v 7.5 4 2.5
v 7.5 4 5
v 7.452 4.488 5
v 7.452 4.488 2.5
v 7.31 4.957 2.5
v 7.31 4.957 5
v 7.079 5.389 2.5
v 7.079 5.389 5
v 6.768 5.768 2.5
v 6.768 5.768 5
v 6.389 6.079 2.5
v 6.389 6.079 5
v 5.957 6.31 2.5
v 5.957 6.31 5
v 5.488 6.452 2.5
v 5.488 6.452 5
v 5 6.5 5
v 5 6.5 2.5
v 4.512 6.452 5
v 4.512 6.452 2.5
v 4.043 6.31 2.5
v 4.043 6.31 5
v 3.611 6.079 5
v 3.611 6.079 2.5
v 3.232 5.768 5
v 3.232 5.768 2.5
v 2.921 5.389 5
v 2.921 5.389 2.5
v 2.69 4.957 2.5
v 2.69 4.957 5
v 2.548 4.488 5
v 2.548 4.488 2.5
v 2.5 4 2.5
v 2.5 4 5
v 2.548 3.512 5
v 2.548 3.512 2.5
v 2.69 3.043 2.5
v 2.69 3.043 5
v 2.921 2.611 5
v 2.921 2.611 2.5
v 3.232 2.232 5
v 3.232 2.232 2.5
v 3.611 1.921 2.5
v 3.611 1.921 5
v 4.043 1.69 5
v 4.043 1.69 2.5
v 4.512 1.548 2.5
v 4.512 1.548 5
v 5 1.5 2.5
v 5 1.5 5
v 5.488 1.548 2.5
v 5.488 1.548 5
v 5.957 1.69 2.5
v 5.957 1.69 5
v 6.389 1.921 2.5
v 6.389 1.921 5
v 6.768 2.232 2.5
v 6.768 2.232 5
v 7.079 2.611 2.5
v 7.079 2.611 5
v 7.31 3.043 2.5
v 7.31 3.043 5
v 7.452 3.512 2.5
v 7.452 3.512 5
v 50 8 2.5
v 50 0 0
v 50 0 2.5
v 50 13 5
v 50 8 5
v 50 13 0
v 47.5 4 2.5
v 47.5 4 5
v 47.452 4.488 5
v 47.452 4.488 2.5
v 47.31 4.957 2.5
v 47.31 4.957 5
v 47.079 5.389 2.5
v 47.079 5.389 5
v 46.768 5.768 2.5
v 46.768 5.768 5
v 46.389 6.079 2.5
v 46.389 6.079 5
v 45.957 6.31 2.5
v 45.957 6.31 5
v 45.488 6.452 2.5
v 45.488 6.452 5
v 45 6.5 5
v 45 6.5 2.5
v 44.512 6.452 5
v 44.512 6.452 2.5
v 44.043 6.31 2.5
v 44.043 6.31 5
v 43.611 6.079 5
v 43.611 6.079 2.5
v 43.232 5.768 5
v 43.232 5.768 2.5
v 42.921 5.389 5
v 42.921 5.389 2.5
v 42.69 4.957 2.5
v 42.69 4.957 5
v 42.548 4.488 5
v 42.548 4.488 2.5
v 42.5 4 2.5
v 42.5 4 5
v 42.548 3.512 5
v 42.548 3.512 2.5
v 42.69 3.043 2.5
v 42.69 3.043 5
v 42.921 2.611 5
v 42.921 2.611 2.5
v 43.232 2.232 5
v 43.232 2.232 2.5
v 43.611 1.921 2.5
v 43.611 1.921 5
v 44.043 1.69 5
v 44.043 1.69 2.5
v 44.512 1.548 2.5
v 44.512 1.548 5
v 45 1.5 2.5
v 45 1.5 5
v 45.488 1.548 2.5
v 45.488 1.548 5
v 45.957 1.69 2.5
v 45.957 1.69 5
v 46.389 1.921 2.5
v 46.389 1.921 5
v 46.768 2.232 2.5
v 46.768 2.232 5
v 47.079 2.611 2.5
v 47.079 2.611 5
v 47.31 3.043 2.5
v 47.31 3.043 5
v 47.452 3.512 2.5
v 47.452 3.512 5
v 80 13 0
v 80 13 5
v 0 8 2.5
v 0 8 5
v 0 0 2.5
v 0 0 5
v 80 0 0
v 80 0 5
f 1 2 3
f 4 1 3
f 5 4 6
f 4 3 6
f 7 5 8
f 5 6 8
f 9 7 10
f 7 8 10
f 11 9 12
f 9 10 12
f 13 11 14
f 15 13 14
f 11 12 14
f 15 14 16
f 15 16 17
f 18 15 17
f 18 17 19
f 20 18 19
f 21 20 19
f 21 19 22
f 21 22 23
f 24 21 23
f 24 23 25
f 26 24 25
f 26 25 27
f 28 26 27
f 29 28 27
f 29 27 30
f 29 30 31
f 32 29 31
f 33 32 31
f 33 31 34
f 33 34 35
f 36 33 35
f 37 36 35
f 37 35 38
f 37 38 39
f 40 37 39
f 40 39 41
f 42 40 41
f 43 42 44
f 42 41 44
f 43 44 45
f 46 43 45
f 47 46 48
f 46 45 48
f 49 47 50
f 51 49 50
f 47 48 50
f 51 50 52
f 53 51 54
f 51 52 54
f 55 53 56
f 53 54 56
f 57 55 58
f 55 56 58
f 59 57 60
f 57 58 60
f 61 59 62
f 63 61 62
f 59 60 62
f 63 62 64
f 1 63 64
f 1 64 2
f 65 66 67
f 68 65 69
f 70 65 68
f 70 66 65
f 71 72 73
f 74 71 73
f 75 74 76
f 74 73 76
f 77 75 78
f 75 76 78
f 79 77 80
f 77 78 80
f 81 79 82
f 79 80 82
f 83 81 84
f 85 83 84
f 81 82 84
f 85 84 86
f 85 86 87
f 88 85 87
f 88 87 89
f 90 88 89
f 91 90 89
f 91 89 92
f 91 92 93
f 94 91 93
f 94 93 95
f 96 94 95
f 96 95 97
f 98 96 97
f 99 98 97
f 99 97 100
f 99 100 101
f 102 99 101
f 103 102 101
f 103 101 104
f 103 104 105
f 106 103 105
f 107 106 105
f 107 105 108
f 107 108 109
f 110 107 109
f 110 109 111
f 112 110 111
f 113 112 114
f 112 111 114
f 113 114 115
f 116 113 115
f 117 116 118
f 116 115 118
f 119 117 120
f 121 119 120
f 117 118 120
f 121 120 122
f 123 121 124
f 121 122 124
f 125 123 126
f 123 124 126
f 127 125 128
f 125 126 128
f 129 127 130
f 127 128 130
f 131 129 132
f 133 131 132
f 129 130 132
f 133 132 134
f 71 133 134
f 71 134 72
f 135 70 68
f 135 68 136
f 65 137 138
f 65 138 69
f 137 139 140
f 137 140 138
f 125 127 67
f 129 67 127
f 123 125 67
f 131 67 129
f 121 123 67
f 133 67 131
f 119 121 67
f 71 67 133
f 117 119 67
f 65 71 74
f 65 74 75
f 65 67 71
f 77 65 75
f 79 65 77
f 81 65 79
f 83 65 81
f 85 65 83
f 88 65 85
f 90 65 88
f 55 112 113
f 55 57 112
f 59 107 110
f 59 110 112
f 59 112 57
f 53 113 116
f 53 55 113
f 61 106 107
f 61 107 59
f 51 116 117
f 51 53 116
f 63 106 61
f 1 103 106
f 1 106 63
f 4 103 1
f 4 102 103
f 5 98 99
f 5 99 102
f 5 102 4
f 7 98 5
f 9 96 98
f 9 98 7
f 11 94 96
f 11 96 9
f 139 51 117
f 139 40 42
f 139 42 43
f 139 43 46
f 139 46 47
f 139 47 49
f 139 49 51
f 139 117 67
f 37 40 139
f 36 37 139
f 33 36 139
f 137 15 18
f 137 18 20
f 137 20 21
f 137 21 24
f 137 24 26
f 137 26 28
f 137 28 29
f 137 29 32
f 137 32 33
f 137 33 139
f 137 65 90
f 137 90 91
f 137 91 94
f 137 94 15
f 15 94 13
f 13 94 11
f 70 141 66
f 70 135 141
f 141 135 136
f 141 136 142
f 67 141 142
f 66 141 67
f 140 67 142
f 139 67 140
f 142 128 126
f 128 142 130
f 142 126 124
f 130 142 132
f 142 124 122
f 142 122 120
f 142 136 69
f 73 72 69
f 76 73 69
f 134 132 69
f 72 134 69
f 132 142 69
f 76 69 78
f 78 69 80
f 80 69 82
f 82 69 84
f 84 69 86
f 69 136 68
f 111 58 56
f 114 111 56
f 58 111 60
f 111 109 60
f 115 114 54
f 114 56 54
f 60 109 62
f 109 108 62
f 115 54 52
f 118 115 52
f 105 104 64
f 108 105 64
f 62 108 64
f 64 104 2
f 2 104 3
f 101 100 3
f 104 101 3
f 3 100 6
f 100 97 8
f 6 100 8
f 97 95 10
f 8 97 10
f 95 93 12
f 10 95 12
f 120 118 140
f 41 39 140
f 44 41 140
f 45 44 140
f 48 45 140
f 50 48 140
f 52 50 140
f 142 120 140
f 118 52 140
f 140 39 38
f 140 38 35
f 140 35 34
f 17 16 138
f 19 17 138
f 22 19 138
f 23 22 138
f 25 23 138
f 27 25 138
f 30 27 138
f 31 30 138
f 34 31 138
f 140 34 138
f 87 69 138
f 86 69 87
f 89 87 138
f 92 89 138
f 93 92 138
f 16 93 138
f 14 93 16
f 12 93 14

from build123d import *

# Parameters (mm, degrees)
BOSS_EXTRU_1_DEPTH      = 5
ESQUISSE3_R             = 2.5
ENL_V_MAT_EXTRU_1_DEPTH = 5
ESQUISSE5_W             = 50
ESQUISSE5_H             = 8
ENL_V_MAT_EXTRU_3_DEPTH = 2.5


with BuildPart() as part:
    # Esquisse2 → Boss.-Extru.1 (new body)
    with BuildSketch(Plane.XY):
        Polygon((0, 0), (0, 8), (50, 8), (50, 13), (80, 13), (80, 0), align=None)
    extrude(amount=BOSS_EXTRU_1_DEPTH)

    # Esquisse3 → Enlèv. mat.-Extru.1 (cut)
    with BuildSketch(Plane.XY.offset(5)):
        with Locations((5, 4)):
            Circle(ESQUISSE3_R)
        with Locations((45, 4)):
            Circle(ESQUISSE3_R)
    extrude(amount=-ENL_V_MAT_EXTRU_1_DEPTH, mode=Mode.SUBTRACT)

    # Esquisse5 → Enlèv. mat.-Extru.3 (cut)
    with BuildSketch(Plane(origin=(0, 0, 0), x_dir=(-1, 0, 0), z_dir=(0, 0, -1))):
        with Locations((-25, 4)):
            Rectangle(ESQUISSE5_W, ESQUISSE5_H)
    extrude(amount=-ENL_V_MAT_EXTRU_3_DEPTH, mode=Mode.SUBTRACT)


solid = part.part
